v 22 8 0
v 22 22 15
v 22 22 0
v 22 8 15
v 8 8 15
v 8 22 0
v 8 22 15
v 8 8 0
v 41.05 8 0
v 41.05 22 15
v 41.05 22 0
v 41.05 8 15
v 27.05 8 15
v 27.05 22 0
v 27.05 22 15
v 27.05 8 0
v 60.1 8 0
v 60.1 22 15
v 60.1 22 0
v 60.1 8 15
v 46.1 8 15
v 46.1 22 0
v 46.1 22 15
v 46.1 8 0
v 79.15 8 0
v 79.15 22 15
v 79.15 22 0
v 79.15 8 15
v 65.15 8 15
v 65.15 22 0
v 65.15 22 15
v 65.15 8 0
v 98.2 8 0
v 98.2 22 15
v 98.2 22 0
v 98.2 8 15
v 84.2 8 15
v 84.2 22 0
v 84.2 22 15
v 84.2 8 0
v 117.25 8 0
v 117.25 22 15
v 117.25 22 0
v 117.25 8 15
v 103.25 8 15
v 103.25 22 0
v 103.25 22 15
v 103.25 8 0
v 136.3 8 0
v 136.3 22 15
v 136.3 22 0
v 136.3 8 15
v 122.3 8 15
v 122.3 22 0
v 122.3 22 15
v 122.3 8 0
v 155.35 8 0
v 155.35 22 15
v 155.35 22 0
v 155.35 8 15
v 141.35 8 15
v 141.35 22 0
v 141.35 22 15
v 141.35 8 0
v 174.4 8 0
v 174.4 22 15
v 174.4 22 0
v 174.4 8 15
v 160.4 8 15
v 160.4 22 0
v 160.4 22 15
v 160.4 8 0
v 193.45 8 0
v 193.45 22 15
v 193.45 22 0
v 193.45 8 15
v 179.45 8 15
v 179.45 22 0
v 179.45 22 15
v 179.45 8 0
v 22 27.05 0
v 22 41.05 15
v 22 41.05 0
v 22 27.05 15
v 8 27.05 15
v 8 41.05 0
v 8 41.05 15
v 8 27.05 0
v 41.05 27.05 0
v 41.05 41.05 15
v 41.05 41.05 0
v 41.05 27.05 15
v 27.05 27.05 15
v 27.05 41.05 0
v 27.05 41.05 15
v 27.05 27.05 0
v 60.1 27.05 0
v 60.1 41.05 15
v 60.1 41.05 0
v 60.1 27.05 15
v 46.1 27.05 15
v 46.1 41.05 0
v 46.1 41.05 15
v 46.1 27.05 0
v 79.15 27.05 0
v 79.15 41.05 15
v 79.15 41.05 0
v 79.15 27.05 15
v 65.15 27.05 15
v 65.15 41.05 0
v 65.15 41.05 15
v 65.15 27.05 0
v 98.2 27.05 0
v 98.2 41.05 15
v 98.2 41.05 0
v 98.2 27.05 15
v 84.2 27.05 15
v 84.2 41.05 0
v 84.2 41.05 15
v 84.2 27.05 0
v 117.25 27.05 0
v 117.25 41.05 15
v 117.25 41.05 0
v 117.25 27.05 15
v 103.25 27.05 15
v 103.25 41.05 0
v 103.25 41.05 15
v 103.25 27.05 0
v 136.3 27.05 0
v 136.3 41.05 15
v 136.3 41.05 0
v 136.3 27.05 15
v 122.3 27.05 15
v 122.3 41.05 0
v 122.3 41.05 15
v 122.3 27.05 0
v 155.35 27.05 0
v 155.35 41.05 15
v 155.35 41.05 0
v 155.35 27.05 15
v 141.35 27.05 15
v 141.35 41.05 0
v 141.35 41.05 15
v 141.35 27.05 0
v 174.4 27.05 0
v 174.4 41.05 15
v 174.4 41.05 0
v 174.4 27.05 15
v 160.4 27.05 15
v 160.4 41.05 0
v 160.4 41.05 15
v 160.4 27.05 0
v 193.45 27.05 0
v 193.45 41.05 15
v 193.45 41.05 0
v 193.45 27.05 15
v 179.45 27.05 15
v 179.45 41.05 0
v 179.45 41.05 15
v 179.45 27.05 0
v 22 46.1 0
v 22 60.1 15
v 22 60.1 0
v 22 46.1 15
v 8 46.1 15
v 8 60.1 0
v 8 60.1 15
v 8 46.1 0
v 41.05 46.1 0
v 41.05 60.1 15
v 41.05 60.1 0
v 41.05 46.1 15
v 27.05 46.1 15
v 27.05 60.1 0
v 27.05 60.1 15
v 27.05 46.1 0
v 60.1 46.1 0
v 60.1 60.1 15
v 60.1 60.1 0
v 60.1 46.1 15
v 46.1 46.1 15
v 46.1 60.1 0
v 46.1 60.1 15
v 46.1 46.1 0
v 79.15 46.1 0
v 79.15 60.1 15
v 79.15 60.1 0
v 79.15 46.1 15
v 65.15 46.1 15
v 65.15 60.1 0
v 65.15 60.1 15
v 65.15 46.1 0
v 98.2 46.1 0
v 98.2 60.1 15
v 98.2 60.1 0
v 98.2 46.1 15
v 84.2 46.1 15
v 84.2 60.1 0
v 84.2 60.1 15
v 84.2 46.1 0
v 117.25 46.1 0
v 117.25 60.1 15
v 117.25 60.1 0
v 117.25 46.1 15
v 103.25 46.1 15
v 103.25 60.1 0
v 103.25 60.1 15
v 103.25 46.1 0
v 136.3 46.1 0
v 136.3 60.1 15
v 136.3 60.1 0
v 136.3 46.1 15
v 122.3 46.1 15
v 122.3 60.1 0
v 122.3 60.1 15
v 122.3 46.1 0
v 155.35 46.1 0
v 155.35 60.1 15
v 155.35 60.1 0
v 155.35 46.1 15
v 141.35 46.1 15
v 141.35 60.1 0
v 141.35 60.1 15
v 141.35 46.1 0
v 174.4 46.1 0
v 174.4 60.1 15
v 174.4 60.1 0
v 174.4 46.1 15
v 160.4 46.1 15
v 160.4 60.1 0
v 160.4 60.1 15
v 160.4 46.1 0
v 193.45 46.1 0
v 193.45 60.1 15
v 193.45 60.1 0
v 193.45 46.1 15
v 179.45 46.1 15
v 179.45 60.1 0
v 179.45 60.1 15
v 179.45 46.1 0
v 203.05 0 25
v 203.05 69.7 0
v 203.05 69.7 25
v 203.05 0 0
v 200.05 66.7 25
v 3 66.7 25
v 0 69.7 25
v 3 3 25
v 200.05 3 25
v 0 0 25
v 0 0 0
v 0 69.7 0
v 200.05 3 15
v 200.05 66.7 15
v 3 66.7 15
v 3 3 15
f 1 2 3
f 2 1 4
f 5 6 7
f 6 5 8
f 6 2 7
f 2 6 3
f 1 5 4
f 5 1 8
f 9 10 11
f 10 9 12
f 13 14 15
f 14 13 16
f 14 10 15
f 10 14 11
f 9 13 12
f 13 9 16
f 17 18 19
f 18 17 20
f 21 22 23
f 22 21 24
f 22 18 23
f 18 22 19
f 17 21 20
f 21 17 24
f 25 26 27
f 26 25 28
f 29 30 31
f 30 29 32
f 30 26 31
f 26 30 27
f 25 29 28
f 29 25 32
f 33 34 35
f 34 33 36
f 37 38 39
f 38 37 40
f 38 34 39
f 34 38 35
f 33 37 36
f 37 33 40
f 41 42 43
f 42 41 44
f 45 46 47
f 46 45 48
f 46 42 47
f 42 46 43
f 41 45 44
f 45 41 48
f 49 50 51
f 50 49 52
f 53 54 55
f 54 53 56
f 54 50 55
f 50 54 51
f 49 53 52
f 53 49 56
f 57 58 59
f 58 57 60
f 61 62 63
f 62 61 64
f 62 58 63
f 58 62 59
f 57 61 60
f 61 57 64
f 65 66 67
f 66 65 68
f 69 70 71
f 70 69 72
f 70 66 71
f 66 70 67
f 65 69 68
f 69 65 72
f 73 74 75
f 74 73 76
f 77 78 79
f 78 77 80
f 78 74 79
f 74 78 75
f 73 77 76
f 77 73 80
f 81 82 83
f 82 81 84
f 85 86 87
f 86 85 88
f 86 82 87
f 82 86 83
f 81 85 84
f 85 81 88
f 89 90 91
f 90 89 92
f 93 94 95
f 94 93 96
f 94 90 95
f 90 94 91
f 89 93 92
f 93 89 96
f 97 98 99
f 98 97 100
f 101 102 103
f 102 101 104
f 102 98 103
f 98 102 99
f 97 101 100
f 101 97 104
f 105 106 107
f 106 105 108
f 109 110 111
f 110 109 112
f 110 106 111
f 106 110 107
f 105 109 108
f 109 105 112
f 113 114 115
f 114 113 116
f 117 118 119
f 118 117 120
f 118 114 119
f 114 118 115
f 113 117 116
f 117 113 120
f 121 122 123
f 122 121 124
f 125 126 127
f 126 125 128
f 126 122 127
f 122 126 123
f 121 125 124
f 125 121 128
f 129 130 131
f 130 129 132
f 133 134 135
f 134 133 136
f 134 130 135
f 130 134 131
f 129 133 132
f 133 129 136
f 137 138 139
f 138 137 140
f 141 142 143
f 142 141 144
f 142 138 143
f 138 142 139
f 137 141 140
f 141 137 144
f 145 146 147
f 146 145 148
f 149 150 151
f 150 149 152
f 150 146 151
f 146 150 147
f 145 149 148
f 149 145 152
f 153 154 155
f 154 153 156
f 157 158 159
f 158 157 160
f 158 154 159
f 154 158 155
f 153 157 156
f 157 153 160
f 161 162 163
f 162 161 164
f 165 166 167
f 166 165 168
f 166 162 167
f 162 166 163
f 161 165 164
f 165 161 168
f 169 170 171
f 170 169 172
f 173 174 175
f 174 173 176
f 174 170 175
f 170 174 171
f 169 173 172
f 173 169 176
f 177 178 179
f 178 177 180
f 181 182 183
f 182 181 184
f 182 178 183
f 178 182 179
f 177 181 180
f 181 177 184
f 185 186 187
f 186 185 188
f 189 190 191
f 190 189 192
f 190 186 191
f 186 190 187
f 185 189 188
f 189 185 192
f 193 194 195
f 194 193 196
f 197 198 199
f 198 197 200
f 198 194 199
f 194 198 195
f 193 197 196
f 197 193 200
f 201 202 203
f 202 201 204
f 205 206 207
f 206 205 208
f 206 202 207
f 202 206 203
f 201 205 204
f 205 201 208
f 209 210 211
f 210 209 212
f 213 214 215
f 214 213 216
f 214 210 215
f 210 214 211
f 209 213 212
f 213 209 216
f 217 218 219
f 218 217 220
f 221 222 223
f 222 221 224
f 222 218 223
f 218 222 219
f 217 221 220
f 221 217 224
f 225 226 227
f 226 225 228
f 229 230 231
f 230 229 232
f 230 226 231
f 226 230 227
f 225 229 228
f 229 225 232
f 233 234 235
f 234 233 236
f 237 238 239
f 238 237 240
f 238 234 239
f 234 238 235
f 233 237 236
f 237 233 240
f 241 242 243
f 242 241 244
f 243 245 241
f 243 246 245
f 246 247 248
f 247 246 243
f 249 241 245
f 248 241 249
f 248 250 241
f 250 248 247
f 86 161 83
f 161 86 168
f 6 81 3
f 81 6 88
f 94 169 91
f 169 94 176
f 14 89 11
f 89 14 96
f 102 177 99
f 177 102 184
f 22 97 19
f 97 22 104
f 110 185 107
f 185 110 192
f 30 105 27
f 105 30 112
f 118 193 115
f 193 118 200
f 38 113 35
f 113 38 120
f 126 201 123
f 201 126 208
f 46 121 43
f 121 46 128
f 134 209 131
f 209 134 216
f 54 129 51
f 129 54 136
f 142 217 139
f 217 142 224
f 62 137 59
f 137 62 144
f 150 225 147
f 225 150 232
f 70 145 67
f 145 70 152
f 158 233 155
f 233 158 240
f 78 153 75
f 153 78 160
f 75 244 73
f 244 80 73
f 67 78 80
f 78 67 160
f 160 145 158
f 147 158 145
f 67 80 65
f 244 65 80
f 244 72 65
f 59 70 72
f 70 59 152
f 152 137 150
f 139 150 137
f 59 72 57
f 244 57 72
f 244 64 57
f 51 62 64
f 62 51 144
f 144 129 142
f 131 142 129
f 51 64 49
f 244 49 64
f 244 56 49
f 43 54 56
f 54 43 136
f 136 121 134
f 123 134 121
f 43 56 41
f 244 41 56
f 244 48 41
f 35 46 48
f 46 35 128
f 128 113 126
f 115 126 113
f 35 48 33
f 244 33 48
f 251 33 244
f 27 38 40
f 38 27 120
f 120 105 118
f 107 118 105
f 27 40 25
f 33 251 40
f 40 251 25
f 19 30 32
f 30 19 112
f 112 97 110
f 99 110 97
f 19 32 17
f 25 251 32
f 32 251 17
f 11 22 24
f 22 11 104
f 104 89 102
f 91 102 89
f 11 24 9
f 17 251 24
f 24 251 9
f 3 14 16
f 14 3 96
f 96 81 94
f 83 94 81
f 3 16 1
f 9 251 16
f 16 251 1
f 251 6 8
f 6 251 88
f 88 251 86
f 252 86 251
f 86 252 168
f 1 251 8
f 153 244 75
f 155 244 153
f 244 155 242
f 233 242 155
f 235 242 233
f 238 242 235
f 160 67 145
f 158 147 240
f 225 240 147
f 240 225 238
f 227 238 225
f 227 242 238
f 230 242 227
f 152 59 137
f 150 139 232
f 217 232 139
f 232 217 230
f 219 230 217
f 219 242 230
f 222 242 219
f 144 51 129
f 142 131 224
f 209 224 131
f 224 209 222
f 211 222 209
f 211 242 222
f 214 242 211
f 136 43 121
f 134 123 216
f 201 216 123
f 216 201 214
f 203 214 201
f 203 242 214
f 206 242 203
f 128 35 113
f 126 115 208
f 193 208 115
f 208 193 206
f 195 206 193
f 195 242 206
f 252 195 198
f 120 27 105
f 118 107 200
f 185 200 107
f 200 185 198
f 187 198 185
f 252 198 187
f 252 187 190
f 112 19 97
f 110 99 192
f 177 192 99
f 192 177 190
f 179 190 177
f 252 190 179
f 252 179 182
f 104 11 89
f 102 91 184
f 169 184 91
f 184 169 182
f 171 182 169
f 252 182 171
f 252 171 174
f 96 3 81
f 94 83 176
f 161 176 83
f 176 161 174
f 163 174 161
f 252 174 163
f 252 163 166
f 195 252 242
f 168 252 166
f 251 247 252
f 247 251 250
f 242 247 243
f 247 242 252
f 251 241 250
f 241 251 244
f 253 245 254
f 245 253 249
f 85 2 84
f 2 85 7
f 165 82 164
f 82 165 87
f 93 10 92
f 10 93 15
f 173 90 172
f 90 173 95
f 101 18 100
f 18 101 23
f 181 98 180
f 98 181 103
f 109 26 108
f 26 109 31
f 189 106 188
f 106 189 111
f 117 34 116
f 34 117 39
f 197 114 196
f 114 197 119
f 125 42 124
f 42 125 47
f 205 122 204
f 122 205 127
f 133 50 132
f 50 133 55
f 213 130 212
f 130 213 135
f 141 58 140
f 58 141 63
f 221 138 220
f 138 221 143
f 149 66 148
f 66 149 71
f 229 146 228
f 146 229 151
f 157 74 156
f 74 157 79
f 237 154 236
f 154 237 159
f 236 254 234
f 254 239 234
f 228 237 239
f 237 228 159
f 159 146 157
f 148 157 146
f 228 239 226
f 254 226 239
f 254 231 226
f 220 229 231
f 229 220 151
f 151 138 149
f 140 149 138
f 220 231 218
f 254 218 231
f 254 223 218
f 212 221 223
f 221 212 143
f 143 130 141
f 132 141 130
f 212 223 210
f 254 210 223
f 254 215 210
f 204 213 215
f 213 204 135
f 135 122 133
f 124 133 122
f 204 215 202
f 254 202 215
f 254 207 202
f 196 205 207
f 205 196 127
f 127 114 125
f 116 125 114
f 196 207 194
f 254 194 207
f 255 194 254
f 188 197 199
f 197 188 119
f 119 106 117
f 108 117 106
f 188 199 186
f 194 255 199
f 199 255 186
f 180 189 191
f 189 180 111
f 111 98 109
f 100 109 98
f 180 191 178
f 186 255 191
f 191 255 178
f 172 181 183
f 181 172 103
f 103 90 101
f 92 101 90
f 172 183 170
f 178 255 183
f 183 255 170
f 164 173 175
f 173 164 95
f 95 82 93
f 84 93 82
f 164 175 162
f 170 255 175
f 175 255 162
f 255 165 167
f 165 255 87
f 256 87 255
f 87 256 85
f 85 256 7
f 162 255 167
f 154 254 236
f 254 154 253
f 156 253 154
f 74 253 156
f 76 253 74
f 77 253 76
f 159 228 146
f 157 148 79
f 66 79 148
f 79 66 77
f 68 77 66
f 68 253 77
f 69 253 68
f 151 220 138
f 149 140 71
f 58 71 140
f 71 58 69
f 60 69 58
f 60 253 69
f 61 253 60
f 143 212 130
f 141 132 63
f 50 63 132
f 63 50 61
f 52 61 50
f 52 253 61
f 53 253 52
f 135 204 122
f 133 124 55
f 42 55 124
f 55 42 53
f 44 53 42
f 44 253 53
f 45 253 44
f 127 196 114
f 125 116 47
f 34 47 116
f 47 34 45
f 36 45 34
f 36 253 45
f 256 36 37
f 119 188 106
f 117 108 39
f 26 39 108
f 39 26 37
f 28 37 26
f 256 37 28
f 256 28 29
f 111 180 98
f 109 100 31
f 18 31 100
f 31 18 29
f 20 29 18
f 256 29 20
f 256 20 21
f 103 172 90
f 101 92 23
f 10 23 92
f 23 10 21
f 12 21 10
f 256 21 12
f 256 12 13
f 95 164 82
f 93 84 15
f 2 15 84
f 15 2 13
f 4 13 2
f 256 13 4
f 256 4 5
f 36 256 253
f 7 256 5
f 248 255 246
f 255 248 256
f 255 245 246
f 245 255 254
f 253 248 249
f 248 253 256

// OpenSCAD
// Generated keyboard case
// Layout: 3x10
// Switch type: Cherry MX

// Parameters
case_width = 203.05;
case_height = 69.70;
case_depth = 25.00;
wall_thickness = 3.00;
base_height = 15.00;
switch_cutout_size = 14.00;
key_spacing = 19.05;

module keyboard_case() {
    difference() {
        // Outer shell
        translate([0, 0, 0])
            cube([case_width, case_height, case_depth]);

        // Inner cavity
        translate([wall_thickness, wall_thickness, base_height])
            cube([case_width - 2*wall_thickness, 
                  case_height - 2*wall_thickness, 
                  case_depth - base_height + 1]);

        // Switch cutouts
        translate([wall_thickness + 5 - 0.00, wall_thickness + 5 - 0.00, -1])
            switch_plate();
    }
}

module switch_plate() {
    translate([0.00, 0.00, 0])
        cube([switch_cutout_size, switch_cutout_size, base_height + 2]);
    translate([19.05, 0.00, 0])
        cube([switch_cutout_size, switch_cutout_size, base_height + 2]);
    translate([38.10, 0.00, 0])
        cube([switch_cutout_size, switch_cutout_size, base_height + 2]);
    translate([57.15, 0.00, 0])
        cube([switch_cutout_size, switch_cutout_size, base_height + 2]);
    translate([76.20, 0.00, 0])
        cube([switch_cutout_size, switch_cutout_size, base_height + 2]);
    translate([95.25, 0.00, 0])
        cube([switch_cutout_size, switch_cutout_size, base_height + 2]);
    translate([114.30, 0.00, 0])
        cube([switch_cutout_size, switch_cutout_size, base_height + 2]);
    translate([133.35, 0.00, 0])
        cube([switch_cutout_size, switch_cutout_size, base_height + 2]);
    translate([152.40, 0.00, 0])
        cube([switch_cutout_size, switch_cutout_size, base_height + 2]);
    translate([171.45, 0.00, 0])
        cube([switch_cutout_size, switch_cutout_size, base_height + 2]);
    translate([0.00, 19.05, 0])
        cube([switch_cutout_size, switch_cutout_size, base_height + 2]);
    translate([19.05, 19.05, 0])
        cube([switch_cutout_size, switch_cutout_size, base_height + 2]);
    translate([38.10, 19.05, 0])
        cube([switch_cutout_size, switch_cutout_size, base_height + 2]);
    translate([57.15, 19.05, 0])
        cube([switch_cutout_size, switch_cutout_size, base_height + 2]);
    translate([76.20, 19.05, 0])
        cube([switch_cutout_size, switch_cutout_size, base_height + 2]);
    translate([95.25, 19.05, 0])
        cube([switch_cutout_size, switch_cutout_size, base_height + 2]);
    translate([114.30, 19.05, 0])
        cube([switch_cutout_size, switch_cutout_size, base_height + 2]);
    translate([133.35, 19.05, 0])
        cube([switch_cutout_size, switch_cutout_size, base_height + 2]);
    translate([152.40, 19.05, 0])
        cube([switch_cutout_size, switch_cutout_size, base_height + 2]);
    translate([171.45, 19.05, 0])
        cube([switch_cutout_size, switch_cutout_size, base_height + 2]);
    translate([0.00, 38.10, 0])
        cube([switch_cutout_size, switch_cutout_size, base_height + 2]);
    translate([19.05, 38.10, 0])
        cube([switch_cutout_size, switch_cutout_size, base_height + 2]);
    translate([38.10, 38.10, 0])
        cube([switch_cutout_size, switch_cutout_size, base_height + 2]);
    translate([57.15, 38.10, 0])
        cube([switch_cutout_size, switch_cutout_size, base_height + 2]);
    translate([76.20, 38.10, 0])
        cube([switch_cutout_size, switch_cutout_size, base_height + 2]);
    translate([95.25, 38.10, 0])
        cube([switch_cutout_size, switch_cutout_size, base_height + 2]);
    translate([114.30, 38.10, 0])
        cube([switch_cutout_size, switch_cutout_size, base_height + 2]);
    translate([133.35, 38.10, 0])
        cube([switch_cutout_size, switch_cutout_size, base_height + 2]);
    translate([152.40, 38.10, 0])
        cube([switch_cutout_size, switch_cutout_size, base_height + 2]);
    translate([171.45, 38.10, 0])
        cube([switch_cutout_size, switch_cutout_size, base_height + 2]);
}

// Generate the case
keyboard_case();
